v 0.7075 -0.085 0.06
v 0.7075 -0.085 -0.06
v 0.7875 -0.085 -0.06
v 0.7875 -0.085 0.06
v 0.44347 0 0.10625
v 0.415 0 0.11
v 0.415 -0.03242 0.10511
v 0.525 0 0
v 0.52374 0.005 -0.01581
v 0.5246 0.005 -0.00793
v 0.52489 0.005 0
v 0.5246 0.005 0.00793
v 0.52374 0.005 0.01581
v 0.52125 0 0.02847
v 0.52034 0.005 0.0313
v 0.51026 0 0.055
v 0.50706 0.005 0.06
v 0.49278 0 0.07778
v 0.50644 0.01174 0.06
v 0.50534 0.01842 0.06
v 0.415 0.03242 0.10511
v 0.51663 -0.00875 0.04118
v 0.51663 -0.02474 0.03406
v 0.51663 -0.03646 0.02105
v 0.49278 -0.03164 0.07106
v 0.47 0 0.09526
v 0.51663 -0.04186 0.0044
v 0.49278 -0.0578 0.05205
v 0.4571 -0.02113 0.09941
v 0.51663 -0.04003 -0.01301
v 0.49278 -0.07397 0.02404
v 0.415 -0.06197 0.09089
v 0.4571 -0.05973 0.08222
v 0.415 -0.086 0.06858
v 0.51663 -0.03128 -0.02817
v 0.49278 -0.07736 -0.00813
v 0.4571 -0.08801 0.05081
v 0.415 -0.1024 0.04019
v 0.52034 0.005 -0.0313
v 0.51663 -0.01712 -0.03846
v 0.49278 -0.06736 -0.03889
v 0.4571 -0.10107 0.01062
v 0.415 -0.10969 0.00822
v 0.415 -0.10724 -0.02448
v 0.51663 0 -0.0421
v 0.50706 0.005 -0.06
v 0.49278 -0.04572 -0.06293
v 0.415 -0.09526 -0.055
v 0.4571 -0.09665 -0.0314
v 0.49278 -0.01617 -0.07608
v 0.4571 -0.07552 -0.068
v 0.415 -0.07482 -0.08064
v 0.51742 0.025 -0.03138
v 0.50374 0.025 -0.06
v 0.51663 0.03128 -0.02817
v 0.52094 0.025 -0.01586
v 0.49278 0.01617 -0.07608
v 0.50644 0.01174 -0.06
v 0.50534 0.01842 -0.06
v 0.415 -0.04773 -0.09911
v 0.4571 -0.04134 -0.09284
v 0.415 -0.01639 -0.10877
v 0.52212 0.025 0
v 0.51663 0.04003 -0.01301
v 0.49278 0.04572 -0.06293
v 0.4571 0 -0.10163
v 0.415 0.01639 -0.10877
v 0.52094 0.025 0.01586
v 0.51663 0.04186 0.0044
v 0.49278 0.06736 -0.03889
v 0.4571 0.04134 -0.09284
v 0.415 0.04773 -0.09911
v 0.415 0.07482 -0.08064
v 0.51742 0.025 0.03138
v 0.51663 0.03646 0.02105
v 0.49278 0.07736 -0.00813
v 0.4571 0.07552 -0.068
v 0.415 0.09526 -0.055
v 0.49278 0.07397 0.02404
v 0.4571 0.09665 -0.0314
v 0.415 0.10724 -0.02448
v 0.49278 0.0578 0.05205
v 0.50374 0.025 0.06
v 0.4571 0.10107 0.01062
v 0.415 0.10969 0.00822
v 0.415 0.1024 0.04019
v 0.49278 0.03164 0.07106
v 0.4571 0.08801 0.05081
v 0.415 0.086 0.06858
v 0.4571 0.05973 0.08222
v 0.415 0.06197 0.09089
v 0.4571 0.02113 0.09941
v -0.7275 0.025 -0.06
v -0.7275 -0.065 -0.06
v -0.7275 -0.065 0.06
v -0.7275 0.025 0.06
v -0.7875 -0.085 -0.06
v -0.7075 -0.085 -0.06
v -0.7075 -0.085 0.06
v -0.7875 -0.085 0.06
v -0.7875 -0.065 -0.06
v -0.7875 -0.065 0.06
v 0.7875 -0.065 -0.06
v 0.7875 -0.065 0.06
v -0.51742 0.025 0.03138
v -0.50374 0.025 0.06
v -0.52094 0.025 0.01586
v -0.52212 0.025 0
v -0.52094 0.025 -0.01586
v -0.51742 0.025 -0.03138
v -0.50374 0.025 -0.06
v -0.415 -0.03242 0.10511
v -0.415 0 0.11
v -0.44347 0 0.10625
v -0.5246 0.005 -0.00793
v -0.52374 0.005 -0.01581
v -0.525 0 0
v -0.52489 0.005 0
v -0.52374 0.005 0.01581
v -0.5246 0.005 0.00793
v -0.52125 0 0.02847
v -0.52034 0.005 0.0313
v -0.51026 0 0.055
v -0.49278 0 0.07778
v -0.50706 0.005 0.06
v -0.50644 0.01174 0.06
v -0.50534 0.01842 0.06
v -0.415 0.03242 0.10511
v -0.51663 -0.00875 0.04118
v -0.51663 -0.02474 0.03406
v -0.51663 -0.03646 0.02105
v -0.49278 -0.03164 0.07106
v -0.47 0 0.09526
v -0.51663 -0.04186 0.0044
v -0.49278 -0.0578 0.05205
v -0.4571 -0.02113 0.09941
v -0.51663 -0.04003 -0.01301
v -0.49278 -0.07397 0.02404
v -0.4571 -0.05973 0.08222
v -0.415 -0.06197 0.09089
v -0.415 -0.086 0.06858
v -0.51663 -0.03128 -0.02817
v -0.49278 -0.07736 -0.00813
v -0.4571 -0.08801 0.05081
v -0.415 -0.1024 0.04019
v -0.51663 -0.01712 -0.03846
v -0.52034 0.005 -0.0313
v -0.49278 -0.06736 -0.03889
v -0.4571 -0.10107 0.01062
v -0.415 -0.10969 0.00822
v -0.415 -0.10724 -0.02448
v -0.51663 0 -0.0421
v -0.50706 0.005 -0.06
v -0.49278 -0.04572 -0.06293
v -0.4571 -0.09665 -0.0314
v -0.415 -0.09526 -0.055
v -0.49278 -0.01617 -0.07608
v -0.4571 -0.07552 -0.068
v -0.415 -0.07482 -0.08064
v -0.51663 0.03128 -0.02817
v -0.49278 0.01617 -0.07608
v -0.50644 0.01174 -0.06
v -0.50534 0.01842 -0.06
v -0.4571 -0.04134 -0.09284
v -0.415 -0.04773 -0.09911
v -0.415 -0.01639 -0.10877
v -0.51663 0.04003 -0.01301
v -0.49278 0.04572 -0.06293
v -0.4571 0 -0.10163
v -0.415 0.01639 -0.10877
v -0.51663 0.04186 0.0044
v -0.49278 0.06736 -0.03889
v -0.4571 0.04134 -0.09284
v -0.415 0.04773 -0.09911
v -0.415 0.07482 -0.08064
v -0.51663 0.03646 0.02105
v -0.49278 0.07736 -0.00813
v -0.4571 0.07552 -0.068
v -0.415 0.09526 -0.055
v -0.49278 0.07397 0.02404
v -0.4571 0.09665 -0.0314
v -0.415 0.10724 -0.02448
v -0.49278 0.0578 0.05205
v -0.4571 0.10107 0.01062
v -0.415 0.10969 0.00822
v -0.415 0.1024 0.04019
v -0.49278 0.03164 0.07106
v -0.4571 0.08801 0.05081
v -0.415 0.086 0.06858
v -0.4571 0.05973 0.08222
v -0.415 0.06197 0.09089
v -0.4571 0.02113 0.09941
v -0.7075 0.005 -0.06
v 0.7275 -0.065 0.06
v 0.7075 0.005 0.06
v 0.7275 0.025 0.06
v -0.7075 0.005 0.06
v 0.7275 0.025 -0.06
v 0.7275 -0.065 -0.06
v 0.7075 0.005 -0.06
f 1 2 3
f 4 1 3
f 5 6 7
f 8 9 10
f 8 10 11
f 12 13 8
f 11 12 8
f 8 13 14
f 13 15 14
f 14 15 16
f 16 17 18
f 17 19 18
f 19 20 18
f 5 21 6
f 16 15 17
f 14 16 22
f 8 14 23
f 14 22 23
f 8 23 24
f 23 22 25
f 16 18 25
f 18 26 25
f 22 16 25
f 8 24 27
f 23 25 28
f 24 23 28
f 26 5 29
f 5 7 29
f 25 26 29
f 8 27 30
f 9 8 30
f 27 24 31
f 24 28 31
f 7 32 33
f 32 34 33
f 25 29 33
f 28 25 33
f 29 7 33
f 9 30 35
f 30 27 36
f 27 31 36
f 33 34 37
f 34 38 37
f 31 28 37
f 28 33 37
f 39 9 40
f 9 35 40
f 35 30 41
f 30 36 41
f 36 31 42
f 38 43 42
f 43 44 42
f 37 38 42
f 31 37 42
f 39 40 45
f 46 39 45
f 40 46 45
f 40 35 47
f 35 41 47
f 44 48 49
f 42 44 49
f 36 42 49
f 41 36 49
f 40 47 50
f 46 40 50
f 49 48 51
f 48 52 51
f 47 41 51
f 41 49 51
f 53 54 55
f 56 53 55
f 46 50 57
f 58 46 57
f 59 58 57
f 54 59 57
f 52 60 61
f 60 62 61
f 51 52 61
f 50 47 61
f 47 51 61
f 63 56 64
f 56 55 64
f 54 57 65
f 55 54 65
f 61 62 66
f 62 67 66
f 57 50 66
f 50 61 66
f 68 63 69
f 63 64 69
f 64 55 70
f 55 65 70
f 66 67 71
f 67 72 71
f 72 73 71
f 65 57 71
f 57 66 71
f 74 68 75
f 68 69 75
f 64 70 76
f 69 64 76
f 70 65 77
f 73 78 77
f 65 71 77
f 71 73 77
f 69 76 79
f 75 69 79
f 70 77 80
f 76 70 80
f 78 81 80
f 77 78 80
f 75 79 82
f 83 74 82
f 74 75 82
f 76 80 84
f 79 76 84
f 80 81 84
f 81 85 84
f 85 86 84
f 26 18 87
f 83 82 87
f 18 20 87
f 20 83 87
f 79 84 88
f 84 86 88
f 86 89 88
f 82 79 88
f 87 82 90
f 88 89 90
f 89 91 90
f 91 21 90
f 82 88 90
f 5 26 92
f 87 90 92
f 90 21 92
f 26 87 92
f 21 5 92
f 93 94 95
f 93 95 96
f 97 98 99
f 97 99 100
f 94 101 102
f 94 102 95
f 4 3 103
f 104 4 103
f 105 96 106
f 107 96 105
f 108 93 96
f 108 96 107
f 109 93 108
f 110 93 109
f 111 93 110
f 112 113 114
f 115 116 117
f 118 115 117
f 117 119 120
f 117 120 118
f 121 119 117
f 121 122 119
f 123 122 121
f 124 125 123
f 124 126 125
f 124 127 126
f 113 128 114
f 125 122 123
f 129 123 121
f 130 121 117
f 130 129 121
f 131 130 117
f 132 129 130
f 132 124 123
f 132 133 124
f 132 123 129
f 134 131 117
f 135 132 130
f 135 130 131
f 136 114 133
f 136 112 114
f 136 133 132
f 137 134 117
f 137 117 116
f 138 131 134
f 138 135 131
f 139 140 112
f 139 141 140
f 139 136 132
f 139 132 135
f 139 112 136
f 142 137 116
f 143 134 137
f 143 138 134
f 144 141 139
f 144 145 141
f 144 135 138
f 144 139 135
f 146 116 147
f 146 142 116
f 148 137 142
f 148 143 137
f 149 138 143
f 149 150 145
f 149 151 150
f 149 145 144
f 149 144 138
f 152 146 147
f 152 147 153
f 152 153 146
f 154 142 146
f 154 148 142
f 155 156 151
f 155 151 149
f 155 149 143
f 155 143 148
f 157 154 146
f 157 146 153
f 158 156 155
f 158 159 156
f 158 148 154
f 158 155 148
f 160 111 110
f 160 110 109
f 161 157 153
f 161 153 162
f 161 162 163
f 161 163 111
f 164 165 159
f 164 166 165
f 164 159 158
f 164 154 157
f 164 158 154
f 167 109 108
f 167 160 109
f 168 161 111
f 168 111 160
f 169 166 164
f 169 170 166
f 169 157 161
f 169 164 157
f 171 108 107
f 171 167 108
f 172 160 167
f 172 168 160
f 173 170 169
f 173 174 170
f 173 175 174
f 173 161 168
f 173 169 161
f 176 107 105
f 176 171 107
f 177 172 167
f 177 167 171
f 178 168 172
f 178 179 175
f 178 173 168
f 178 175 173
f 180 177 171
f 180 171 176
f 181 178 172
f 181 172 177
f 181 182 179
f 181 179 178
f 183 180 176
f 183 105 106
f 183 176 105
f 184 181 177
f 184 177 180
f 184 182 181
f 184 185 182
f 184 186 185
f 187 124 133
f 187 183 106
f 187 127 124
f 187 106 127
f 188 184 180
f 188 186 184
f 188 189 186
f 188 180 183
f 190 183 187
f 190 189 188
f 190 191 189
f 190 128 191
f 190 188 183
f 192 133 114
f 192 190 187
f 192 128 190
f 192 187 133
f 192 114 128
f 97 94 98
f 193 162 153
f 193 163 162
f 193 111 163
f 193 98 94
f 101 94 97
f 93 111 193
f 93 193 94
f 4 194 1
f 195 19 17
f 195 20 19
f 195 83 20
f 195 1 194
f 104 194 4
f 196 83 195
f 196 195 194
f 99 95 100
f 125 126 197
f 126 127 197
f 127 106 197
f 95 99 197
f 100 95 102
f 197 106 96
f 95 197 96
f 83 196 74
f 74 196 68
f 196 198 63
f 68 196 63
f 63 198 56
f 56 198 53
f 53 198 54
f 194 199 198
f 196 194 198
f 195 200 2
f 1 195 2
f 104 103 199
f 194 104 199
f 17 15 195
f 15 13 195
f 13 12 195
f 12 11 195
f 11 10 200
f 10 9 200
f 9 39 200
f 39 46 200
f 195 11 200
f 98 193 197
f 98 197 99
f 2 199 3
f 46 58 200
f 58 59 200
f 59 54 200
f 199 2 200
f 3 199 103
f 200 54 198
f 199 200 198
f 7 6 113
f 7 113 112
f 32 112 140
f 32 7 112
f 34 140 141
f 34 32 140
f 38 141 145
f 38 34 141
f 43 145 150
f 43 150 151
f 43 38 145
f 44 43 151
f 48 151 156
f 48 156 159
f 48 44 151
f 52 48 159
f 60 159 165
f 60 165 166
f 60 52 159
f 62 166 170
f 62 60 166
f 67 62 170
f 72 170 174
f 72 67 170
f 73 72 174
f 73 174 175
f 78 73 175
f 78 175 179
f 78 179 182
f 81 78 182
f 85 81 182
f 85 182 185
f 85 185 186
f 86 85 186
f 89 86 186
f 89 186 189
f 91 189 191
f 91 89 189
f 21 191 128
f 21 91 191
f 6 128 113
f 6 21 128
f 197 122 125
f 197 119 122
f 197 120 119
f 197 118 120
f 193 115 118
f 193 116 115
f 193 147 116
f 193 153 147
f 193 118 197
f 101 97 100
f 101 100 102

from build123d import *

# Parameters (mm, degrees)
ESQUISSE1_W             = 1.05
ESQUISSE1_H             = 0.11
CONG_2_R                = 0.11
BOSS_EXTRU_1_DEPTH      = 0.06
BOSS_EXTRU_1_DEPTH_BACK = 0.06


with BuildPart() as part:
    # Esquisse1 → Révolution2 (revolve)
    with BuildSketch(Plane(origin=(0, 0, 0), x_dir=(1, 0, 0), z_dir=(0, 1, 0))):
        with Locations((0, 0.055)):
            Rectangle(ESQUISSE1_W, ESQUISSE1_H)
    revolve(axis=Axis((-0.525, 0, 0), (1, 0, 0)))

    # Congé2
    cong_2_edges = [part.edges().sort_by_distance(p)[0] for p in [
        (0.525, 0, 0.11),
        (-0.525, 0, 0.11),
    ]]
    fillet(cong_2_edges, radius=CONG_2_R)

    # Esquisse2 → Boss.-Extru.1 (add, two sides: drawn at the far end of the back side and taken through both)
    with BuildSketch(Plane.XY.offset(-BOSS_EXTRU_1_DEPTH_BACK)):
        Polygon((-0.7075, -0.085), (-0.7875, -0.085), (-0.7875, -0.065), (-0.7275, -0.065), (-0.7275, 0.025), (-0.415, 0.025), (-0.415, 0.005), (-0.7075, 0.005), align=None)
        Polygon((0.415, 0.005), (0.7075, 0.005), (0.7075, -0.085), (0.7875, -0.085), (0.7875, -0.065), (0.7275, -0.065), (0.7275, 0.025), (0.415, 0.025), align=None)
    extrude(amount=BOSS_EXTRU_1_DEPTH + BOSS_EXTRU_1_DEPTH_BACK)


solid = part.part
